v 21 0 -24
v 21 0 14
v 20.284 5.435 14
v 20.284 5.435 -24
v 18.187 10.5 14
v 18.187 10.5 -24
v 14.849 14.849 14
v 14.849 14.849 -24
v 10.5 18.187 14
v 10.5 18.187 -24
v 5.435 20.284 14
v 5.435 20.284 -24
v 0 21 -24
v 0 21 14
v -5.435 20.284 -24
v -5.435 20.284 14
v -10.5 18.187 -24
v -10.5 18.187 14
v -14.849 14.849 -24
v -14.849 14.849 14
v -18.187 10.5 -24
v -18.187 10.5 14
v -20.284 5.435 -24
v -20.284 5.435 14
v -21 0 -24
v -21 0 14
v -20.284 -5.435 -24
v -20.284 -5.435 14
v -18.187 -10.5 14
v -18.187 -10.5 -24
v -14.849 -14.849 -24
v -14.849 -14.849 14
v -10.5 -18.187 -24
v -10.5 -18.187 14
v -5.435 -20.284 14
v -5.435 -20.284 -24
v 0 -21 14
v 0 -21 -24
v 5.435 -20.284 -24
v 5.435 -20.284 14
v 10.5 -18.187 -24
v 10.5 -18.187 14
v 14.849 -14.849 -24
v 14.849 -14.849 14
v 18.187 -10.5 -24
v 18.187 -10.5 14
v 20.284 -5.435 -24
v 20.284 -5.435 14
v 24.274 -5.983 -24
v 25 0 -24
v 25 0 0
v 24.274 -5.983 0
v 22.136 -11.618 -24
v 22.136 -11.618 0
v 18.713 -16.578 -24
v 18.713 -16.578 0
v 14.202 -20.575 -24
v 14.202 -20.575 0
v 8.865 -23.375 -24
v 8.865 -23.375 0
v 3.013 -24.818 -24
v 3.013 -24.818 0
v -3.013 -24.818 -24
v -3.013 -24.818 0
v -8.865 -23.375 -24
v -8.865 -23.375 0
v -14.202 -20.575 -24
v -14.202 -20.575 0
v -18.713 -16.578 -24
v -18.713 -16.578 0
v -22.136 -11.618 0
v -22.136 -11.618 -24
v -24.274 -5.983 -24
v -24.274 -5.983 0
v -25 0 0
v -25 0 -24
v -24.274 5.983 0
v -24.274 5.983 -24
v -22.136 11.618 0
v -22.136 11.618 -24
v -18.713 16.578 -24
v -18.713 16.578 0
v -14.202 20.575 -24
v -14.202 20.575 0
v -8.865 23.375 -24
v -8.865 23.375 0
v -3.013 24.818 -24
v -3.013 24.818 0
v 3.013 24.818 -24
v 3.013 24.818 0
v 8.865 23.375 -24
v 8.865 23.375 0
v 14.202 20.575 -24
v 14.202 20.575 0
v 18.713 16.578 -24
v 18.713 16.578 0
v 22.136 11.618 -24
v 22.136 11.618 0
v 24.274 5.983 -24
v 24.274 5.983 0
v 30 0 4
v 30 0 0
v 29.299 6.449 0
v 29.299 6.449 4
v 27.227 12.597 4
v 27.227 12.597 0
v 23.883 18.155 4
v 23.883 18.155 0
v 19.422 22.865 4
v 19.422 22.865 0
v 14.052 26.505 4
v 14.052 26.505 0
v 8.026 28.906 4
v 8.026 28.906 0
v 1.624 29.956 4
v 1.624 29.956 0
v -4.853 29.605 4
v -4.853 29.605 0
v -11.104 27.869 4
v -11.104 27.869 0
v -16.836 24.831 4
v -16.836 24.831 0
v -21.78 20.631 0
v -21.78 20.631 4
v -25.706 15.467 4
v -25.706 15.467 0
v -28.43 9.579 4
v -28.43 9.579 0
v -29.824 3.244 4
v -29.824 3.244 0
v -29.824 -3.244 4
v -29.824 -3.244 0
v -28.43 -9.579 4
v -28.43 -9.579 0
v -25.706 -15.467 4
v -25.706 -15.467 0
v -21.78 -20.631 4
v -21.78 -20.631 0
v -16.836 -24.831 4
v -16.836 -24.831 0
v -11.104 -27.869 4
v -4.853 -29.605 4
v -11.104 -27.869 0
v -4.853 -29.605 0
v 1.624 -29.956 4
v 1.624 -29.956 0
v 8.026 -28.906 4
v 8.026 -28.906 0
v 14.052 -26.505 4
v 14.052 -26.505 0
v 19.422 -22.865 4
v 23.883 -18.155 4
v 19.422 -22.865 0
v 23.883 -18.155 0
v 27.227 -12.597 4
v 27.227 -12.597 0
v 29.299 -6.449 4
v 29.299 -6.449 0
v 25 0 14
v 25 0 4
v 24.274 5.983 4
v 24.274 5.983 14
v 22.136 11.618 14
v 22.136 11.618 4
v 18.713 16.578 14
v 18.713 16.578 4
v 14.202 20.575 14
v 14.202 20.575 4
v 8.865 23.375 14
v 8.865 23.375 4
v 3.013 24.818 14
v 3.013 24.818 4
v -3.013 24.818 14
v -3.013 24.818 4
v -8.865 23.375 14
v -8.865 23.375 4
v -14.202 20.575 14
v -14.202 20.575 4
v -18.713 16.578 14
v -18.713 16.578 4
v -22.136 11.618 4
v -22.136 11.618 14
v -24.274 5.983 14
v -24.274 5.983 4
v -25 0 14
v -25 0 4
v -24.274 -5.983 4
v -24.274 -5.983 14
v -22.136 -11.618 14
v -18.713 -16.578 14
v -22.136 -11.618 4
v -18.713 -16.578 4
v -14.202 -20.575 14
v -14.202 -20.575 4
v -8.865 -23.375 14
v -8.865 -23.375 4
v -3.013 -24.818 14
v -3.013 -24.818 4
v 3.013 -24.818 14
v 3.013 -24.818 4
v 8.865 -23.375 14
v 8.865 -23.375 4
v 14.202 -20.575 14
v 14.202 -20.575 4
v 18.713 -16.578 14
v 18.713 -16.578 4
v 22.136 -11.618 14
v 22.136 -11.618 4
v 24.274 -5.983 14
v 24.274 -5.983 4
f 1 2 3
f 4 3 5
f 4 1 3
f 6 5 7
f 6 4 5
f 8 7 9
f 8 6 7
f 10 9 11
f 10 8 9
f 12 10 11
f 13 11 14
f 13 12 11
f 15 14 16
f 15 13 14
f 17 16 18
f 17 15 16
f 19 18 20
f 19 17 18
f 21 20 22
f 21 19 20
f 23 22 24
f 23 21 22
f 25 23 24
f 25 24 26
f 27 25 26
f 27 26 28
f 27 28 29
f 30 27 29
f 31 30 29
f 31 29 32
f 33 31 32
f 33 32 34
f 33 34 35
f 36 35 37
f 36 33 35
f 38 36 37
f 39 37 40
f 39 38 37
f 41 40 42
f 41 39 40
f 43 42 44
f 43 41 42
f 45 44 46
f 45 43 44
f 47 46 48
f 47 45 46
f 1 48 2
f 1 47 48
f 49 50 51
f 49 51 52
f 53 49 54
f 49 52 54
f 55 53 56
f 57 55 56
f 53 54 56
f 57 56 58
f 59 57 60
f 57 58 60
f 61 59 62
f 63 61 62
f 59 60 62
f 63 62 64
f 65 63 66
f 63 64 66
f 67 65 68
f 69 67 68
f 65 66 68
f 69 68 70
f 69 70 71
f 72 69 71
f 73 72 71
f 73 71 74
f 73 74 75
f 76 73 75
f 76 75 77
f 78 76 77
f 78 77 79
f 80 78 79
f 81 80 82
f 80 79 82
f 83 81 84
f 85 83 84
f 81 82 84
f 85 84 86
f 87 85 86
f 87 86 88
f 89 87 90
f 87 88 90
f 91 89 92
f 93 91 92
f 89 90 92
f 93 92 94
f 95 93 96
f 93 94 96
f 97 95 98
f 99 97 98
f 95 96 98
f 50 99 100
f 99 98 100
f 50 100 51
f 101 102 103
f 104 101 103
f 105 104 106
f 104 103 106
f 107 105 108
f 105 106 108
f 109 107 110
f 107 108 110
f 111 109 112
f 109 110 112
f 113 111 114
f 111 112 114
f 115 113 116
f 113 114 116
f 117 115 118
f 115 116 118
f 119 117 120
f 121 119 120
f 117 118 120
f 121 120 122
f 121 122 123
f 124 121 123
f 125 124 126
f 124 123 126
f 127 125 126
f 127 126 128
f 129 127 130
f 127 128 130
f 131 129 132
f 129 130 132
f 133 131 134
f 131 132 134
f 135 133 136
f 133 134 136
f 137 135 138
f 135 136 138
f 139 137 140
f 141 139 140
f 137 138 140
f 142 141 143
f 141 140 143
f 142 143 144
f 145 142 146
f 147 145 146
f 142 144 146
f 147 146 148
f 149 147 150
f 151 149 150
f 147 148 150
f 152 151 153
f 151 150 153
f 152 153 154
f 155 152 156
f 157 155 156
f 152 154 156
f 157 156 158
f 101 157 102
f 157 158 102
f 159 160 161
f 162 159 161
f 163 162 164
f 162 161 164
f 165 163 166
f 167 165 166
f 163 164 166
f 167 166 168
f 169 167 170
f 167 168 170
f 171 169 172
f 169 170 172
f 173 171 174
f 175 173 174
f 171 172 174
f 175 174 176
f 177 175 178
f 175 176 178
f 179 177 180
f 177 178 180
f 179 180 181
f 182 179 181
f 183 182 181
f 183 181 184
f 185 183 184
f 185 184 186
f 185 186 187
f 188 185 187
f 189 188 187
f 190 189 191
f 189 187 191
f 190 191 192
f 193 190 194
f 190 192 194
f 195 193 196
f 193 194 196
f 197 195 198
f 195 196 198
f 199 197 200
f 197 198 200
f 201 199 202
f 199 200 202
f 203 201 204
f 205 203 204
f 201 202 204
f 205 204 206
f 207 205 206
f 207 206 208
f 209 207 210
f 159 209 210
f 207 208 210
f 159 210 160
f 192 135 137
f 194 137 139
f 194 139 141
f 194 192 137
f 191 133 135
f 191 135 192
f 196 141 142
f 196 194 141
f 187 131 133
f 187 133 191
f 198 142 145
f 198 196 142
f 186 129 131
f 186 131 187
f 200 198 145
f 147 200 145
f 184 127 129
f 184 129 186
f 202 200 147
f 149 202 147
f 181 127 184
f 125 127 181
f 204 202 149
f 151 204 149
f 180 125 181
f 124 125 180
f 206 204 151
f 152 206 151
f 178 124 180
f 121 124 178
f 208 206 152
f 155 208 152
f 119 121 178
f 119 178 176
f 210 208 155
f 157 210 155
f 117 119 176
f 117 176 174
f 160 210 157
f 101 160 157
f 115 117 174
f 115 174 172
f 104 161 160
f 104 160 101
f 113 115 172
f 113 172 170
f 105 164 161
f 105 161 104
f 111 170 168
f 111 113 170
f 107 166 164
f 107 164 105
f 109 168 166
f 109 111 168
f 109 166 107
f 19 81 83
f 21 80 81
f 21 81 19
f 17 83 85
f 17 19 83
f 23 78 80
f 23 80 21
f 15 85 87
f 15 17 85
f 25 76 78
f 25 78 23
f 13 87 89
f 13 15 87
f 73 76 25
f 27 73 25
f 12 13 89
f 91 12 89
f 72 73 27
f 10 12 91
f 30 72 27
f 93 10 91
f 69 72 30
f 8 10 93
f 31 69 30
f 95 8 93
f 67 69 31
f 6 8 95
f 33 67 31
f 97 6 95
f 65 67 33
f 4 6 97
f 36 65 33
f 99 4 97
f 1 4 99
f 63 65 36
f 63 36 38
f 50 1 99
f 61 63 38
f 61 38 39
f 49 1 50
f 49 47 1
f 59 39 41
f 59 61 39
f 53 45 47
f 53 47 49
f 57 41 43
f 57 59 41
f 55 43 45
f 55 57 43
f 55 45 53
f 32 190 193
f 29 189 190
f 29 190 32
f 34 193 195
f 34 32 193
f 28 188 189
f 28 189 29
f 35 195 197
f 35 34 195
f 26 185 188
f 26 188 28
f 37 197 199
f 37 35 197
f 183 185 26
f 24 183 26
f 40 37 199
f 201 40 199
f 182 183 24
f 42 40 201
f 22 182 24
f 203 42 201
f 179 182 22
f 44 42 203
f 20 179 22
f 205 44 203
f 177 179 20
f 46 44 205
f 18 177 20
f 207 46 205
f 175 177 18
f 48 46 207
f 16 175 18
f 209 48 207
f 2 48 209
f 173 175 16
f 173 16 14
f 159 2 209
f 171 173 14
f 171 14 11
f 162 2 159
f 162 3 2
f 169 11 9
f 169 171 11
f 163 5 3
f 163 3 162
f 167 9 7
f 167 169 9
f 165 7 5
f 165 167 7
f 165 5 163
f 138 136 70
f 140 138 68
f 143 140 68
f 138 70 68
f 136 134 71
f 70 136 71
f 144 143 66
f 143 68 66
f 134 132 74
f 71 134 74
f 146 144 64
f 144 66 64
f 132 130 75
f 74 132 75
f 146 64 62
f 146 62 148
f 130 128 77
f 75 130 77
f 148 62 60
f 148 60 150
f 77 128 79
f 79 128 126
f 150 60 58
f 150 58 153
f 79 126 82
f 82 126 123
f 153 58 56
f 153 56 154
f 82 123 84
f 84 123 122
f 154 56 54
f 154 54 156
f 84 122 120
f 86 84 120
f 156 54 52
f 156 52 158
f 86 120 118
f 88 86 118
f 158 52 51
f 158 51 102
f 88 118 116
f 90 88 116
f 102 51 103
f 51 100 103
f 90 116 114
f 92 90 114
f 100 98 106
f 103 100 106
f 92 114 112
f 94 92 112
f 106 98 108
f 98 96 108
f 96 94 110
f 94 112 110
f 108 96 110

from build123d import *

# Parameters (mm, degrees)
SKETCH_R      = 30
SKETCH_R_2    = 21
PAD_DEPTH     = 4
SKETCH001_R   = 25
SKETCH001_R_2 = 21
PAD001_DEPTH  = 24
SKETCH002_R   = 25
SKETCH002_R_2 = 21
PAD002_DEPTH  = 10


with BuildPart() as part:
    # Sketch → Pad (new body)
    with BuildSketch(Plane.XY):
        Circle(SKETCH_R)
        Circle(SKETCH_R_2, mode=Mode.SUBTRACT)
    extrude(amount=PAD_DEPTH)

    # Sketch001 (on Face3 of Pad) → Pad001 (join)
    with BuildSketch(Plane(origin=(0, 0, 0), x_dir=(1, 0, 0), z_dir=(0, 0, -1))):
        Circle(SKETCH001_R)
        Circle(SKETCH001_R_2, mode=Mode.SUBTRACT)
    extrude(amount=PAD001_DEPTH)

    # Sketch002 (on Face3 of Pad001) → Pad002 (join)
    with BuildSketch(Plane.XY.offset(4)):
        Circle(SKETCH002_R)
        Circle(SKETCH002_R_2, mode=Mode.SUBTRACT)
    extrude(amount=PAD002_DEPTH)


solid = part.part
